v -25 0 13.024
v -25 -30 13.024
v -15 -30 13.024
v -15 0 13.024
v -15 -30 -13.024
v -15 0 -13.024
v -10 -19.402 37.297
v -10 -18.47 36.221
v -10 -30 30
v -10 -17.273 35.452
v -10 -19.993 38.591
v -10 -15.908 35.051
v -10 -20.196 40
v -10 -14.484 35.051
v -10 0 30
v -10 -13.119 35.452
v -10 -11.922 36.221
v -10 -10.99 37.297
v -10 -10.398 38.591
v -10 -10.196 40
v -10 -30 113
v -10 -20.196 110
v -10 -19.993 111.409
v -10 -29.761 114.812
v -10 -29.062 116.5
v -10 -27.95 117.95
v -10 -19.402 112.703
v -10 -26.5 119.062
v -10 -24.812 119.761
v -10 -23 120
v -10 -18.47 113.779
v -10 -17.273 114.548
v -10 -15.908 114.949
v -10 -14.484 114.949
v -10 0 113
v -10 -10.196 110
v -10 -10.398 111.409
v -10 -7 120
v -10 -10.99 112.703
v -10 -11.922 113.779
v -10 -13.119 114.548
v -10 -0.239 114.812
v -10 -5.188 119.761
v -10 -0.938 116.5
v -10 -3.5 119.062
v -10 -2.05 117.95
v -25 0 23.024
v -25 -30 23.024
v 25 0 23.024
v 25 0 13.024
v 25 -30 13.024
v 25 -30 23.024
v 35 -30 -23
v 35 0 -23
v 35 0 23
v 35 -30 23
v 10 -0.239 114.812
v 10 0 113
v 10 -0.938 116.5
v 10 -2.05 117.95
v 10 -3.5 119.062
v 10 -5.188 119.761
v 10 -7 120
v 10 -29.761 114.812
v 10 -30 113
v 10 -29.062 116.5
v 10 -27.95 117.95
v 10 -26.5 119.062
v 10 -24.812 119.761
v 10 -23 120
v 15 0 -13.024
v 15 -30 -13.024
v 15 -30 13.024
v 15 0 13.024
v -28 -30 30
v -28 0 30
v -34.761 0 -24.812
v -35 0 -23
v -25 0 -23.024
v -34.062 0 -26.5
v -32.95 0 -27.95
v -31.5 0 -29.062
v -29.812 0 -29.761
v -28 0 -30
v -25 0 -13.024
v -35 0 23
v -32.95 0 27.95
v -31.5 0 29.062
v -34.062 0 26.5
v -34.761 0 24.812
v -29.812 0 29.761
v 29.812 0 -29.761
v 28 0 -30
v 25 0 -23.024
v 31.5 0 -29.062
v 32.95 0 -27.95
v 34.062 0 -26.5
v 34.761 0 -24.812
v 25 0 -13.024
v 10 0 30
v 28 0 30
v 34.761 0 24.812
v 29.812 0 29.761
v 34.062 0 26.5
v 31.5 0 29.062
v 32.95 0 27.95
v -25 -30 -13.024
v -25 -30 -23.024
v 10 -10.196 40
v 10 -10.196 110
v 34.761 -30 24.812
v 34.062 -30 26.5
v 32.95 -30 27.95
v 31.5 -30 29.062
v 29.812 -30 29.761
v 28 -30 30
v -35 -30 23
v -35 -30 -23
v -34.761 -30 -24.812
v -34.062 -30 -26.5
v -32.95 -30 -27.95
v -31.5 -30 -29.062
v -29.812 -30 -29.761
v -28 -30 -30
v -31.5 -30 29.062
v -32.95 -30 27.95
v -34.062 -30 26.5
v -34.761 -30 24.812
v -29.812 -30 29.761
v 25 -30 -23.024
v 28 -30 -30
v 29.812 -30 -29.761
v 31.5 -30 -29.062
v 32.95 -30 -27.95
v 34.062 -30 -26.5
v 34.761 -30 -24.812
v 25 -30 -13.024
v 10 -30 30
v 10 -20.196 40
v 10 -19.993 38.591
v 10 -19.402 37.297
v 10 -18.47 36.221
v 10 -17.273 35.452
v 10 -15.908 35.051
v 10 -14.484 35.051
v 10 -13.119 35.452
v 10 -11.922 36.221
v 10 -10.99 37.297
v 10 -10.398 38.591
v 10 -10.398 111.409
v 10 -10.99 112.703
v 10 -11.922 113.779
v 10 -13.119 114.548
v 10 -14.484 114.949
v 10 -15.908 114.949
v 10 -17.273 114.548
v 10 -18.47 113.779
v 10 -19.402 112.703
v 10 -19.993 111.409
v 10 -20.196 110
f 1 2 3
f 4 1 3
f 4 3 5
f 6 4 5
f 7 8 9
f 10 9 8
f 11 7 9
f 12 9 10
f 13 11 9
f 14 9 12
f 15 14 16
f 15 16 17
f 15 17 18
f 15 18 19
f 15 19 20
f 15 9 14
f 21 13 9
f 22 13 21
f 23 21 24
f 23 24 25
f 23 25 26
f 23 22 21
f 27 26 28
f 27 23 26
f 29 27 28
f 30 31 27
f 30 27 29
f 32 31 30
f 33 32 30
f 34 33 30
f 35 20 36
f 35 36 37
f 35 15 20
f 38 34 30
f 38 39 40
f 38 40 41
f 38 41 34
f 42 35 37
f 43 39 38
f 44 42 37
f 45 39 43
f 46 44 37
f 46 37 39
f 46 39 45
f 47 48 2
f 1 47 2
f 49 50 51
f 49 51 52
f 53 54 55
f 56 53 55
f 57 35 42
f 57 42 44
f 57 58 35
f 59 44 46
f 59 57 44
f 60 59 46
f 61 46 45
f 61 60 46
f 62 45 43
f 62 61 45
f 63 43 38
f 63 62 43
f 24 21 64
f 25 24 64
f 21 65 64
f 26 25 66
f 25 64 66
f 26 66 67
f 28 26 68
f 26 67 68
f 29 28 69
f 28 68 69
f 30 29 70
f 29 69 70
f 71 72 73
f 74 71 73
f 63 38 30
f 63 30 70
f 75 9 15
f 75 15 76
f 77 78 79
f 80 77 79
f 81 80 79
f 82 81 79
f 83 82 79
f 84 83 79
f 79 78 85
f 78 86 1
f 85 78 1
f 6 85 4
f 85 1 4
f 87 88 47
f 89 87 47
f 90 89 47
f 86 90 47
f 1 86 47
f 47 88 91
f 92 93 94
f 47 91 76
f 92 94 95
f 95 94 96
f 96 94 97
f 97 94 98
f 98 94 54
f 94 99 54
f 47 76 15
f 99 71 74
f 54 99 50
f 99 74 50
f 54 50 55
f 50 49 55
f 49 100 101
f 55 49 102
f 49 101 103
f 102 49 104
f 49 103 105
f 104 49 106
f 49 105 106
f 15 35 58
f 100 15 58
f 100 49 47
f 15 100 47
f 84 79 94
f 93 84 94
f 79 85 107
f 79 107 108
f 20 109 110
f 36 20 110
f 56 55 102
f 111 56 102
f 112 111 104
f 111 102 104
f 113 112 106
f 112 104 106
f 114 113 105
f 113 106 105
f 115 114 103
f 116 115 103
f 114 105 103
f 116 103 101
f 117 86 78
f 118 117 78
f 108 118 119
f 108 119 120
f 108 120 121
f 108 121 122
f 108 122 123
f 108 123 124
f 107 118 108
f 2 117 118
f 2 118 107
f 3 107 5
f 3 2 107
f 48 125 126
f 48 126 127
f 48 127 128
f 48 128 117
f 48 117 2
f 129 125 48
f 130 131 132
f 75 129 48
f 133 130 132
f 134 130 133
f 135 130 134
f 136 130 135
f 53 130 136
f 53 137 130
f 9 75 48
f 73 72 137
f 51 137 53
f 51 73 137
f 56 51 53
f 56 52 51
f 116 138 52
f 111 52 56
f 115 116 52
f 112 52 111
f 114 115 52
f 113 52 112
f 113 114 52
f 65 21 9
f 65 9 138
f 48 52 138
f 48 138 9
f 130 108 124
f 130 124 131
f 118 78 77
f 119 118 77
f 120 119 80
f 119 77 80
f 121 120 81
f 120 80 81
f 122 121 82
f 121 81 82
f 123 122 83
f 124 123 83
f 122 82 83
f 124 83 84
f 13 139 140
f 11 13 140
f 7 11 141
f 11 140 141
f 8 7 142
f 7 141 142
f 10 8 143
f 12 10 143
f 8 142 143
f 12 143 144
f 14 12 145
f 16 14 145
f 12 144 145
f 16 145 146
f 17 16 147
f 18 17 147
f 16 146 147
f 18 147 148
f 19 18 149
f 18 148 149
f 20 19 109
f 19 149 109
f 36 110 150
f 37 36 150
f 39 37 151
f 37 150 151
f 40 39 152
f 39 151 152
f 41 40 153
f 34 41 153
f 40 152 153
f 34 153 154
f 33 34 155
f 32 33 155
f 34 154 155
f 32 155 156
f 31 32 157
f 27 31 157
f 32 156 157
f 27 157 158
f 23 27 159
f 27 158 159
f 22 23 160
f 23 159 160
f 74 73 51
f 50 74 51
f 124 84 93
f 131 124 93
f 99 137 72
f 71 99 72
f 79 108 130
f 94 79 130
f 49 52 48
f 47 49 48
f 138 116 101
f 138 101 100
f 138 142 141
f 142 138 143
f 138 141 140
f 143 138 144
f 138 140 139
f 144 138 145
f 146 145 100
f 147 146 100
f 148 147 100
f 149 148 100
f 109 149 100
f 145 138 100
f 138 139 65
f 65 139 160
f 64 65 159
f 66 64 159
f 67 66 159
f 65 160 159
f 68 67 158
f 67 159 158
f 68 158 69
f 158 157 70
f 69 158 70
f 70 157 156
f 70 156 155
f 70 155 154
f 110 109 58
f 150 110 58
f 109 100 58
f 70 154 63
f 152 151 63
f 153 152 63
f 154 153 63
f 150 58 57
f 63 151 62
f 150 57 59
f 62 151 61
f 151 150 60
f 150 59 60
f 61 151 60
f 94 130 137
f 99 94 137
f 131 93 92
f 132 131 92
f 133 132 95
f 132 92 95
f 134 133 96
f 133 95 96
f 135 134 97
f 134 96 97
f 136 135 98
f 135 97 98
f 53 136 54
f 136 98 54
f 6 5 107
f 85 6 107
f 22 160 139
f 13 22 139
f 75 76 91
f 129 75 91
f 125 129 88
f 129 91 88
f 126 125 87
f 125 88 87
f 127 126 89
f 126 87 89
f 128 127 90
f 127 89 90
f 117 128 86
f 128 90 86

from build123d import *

# Parameters (mm, degrees)
F0_W     = 20
F0_H     = 90
F1_DEPTH = 30
F3_DEPTH = 82
F5_R     = 7
F7_DEPTH = 40.5


with BuildPart() as f1:
    # F0 (on Front) → F1 (new body)
    with BuildSketch(Plane.XZ):
        with BuildLine():
            Line((-28, -30), (28, -30))
            ThreePointArc((28, -30), (32.949747, -27.949747), (35, -23))
            Line((35, -23), (35, 23))
            ThreePointArc((35, 23), (32.949747, 27.949747), (28, 30))
            Line((28, 30), (10, 30))
            Line((10, 30), (-10, 30))
            Line((-10, 30), (-28, 30))
            ThreePointArc((-28, 30), (-32.949747, 27.949747), (-35, 23))
            Line((-35, 23), (-35, -23))
            ThreePointArc((-35, -23), (-32.949747, -27.949747), (-28, -30))
        make_face()
        with Locations((0, 75)):
            Rectangle(F0_W, F0_H)
    extrude(amount=F1_DEPTH)


with BuildPart() as f3:
    # F2 (on face) → F3 (new body, symmetric)
    with BuildSketch(Plane.XZ.offset(30)):
        Polygon((25, 23.023667), (0, 23.023667), (-25, 23.023667), (-25, 13.023667), (-15, 13.023667), (-15, 0.299923), (-15, -0.299923), (-15, -13.023667), (-25, -13.023667), (-25, -23.023667), (0, -23.023667), (25, -23.023667), (25, -13.023667), (15, -13.023667), (15, -0.299923), (15, 0.299923), (15, 13.023667), (25, 13.023667), align=None)
    extrude(amount=F3_DEPTH, both=True)


with BuildPart() as f1_1:
    add(f1.part)

    # F4: cut F3
    add(f3.part, mode=Mode.SUBTRACT)

    # F5
    f5_edges = [f1_1.edges().sort_by_distance(p)[0] for p in [
        (0, -30, 120),
        (0, 0, 120),
    ]]
    fillet(f5_edges, radius=F5_R)


with BuildPart() as f7:
    # F6 (on face) → F7 (new body)
    with BuildSketch(Plane.YZ.offset(10)):
        with BuildLine():
            ThreePointArc((-10.195938, 110), (-15.195938, 115), (-20.195938, 110))
            Line((-20.195938, 110), (-20.195938, 40))
            ThreePointArc((-20.195938, 40), (-15.195938, 35), (-10.195938, 40))
            Line((-10.195938, 40), (-10.195938, 110))
        make_face()
    extrude(amount=-F7_DEPTH)


with BuildPart() as f1_2:
    add(f1_1.part)

    # F8: cut F7
    add(f7.part, mode=Mode.SUBTRACT)


solid = f1_2.part
